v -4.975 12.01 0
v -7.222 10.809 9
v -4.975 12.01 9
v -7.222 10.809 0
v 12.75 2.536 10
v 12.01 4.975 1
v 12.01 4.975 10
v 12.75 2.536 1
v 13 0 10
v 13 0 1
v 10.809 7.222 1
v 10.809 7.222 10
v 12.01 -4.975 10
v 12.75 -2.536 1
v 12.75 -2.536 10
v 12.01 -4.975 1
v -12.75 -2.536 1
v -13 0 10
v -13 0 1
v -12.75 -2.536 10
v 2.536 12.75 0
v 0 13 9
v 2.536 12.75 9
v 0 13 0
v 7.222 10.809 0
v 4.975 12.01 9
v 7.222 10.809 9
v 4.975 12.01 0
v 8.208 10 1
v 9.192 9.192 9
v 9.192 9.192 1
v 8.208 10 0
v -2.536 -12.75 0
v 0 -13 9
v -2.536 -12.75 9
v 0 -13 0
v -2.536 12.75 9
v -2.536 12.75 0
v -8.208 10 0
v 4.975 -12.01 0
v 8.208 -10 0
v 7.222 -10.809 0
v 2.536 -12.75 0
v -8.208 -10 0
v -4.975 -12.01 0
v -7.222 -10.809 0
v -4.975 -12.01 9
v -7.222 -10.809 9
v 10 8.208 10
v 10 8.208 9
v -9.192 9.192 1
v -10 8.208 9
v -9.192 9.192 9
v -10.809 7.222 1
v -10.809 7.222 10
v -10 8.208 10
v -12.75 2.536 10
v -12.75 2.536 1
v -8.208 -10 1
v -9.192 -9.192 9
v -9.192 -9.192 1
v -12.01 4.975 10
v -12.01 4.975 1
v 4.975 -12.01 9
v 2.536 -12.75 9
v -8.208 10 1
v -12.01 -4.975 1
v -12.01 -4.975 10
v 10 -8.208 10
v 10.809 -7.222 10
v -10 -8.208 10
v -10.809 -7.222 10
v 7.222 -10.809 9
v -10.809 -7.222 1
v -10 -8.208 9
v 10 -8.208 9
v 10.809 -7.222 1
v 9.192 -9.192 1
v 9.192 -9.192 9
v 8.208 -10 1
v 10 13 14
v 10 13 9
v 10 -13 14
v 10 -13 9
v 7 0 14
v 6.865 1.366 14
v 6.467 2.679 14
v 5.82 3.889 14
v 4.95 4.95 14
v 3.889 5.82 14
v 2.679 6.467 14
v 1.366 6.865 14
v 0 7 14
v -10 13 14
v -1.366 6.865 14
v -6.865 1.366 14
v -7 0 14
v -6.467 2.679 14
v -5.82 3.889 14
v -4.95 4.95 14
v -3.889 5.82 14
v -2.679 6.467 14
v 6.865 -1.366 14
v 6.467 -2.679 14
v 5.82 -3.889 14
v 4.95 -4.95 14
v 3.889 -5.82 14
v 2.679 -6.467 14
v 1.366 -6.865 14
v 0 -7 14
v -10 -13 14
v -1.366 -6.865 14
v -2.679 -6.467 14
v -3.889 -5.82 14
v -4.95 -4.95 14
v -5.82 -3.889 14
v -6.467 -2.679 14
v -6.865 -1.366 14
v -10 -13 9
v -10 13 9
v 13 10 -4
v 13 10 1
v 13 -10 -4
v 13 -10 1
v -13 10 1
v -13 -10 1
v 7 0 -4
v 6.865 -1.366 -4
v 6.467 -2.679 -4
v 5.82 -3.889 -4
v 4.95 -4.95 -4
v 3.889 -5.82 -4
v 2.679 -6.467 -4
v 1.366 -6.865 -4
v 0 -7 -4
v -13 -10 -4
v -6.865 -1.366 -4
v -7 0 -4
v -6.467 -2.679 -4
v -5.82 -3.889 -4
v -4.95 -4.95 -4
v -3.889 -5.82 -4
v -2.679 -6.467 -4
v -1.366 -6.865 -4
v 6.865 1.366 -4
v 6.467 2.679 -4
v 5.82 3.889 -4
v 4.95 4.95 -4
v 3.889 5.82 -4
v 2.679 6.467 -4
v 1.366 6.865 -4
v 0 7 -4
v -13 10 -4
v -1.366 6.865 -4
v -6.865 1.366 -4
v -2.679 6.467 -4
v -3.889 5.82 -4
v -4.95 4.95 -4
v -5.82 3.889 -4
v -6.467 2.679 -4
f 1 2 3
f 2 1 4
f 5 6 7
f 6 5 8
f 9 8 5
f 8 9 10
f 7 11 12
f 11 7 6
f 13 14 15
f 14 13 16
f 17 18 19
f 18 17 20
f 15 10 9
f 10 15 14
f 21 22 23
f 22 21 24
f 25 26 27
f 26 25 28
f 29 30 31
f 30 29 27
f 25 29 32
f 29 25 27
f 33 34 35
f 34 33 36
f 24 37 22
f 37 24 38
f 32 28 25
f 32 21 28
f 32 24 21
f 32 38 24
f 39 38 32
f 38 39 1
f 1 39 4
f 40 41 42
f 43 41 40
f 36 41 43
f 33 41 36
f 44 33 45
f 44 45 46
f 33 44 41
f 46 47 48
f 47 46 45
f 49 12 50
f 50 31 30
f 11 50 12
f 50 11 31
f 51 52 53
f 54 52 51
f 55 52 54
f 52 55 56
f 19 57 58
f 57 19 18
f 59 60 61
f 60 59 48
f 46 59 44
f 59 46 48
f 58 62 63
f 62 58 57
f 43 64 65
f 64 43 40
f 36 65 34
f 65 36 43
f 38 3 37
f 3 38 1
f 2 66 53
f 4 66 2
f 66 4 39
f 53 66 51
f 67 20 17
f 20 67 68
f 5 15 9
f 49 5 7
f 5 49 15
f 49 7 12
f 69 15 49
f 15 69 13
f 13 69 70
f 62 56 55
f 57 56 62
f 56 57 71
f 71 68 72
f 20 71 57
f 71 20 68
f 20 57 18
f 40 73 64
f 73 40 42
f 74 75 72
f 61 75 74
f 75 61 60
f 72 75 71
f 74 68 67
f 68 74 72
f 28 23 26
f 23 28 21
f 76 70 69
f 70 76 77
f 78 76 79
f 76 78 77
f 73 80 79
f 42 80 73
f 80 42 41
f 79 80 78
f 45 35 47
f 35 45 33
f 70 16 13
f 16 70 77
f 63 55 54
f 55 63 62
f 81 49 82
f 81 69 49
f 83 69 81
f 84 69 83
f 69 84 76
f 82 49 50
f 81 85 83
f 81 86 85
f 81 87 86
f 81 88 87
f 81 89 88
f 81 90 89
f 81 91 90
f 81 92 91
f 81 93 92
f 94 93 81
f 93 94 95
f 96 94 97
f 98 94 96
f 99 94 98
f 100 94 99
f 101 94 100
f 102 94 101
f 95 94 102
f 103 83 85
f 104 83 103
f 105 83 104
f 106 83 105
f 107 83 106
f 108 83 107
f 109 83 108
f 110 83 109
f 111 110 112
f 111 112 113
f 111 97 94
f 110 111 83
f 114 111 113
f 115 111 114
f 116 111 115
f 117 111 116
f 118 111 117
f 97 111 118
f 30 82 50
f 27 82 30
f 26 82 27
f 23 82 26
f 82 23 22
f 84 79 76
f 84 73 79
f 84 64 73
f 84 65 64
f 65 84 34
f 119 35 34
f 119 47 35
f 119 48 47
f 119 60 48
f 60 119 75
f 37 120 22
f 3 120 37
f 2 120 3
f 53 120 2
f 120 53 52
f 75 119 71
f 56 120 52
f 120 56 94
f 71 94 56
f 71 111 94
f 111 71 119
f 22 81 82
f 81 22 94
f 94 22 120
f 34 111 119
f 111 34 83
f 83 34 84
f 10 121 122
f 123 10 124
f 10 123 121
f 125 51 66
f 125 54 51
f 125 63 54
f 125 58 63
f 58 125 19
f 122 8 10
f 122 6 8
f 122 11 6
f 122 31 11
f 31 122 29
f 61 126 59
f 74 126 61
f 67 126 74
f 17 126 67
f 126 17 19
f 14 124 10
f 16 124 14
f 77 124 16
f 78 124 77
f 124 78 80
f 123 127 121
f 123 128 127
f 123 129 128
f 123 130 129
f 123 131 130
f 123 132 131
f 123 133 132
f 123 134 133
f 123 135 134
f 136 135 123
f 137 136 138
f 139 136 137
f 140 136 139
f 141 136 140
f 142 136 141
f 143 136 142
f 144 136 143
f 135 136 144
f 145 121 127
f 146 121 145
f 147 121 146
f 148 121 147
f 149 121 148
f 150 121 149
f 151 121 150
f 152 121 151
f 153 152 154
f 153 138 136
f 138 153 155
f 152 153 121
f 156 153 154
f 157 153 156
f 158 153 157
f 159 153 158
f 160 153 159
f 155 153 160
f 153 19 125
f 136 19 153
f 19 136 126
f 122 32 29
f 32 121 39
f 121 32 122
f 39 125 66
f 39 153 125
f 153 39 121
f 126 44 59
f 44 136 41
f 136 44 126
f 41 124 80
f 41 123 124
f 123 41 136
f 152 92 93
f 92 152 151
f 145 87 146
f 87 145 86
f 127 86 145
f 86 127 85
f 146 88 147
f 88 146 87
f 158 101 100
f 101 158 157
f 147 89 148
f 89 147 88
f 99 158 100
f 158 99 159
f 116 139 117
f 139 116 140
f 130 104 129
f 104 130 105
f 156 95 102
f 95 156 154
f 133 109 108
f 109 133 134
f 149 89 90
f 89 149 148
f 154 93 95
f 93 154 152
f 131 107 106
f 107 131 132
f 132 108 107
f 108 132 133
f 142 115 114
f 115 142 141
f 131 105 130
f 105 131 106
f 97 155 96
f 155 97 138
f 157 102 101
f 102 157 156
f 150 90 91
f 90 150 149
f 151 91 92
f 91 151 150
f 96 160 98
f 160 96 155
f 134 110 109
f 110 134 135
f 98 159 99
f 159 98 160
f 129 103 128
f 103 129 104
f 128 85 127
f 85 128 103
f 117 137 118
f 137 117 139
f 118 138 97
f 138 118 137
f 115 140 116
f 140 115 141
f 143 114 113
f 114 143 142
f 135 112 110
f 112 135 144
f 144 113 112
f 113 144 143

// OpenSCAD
$fn = 32;

// ----------------------------------------------------------------------
// Oldham coupling disc: 26 x 18 mm
// ----------------------------------------------------------------------

// --- parameters (mm) ---
disc_d = 26;              // disc diameter
disc_t = 10;              // disc thickness
tongue_w = 20;            // tongue width
tongue_h = 4;             // tongue height
bore_d = 14;              // centre lightening bore

module disc() {
  cylinder(h = disc_t, d = disc_d);
  /* tongue on the top face, sunk 1 mm into the disc */
  translate([-tongue_w / 2, -disc_d / 2, disc_t - 1]) cube([tongue_w, disc_d, tongue_h + 1]);
  /* slot wall on the bottom face, 90 degrees turned */
  translate([-disc_d / 2, -tongue_w / 2, -tongue_h]) cube([disc_d, tongue_w, tongue_h + 1]);
}

difference() {
  disc();
  translate([0, 0, -tongue_h - 1]) cylinder(h = disc_t + 2 * tongue_h + 2, d = bore_d);
}
